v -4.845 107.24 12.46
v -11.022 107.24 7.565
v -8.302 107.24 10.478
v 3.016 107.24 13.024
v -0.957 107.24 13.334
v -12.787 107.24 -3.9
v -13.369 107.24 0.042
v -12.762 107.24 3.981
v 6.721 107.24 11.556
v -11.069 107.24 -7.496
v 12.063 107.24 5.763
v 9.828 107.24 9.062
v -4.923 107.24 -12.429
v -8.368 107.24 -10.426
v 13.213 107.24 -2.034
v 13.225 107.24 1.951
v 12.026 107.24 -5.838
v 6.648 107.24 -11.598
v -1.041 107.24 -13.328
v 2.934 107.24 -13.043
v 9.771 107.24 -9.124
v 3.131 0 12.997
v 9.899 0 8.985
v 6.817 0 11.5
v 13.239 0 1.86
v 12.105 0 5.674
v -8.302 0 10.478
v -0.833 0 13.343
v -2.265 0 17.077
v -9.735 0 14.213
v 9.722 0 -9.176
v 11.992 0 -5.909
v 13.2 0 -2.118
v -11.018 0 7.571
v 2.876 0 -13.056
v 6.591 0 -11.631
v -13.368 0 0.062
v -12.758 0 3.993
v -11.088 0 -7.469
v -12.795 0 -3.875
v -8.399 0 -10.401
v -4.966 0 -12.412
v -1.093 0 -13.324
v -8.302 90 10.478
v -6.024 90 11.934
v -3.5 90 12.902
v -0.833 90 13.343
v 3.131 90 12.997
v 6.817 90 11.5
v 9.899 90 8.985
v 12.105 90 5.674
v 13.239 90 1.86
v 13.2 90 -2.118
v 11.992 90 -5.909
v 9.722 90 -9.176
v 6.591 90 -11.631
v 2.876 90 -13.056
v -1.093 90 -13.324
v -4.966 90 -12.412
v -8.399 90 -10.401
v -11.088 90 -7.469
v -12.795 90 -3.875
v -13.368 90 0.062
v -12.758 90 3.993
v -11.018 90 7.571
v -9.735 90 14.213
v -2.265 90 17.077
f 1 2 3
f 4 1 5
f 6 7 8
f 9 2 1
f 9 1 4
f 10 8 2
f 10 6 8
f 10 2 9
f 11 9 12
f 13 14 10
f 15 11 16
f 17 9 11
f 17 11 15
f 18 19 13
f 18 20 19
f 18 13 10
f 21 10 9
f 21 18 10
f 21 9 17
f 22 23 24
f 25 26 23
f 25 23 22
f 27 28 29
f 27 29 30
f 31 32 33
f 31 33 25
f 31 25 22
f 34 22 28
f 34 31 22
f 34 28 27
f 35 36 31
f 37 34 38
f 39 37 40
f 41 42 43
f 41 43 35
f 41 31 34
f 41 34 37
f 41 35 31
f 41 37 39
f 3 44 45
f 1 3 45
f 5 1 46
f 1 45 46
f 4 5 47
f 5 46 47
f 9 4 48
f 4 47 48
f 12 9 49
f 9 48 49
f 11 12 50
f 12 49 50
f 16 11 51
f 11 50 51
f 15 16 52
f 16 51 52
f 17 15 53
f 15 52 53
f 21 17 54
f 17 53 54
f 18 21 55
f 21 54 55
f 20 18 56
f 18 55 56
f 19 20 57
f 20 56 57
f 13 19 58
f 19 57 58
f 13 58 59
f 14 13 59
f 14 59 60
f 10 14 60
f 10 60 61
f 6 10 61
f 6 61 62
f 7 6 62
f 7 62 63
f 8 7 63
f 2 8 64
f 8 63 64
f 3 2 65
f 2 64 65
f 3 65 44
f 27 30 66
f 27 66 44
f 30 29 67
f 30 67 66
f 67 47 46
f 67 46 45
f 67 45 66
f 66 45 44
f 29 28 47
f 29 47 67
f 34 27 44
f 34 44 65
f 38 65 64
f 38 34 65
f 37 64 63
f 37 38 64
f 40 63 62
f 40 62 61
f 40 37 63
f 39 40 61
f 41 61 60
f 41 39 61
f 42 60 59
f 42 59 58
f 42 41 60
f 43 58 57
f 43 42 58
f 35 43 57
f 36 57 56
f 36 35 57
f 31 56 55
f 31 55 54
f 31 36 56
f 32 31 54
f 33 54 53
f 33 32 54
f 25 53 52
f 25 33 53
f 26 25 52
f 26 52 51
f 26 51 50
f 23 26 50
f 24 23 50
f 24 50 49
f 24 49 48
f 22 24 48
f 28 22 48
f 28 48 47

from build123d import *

# Parameters (mm, degrees)
BOSS_EXTRUDE1_DEPTH = 90
SKETCH3_R           = 13.36858006
BOSS_EXTRUDE2_DEPTH = 550
SKETCH4_R           = 30
CUT_EXTRUDE1_DEPTH  = 532.76


with BuildPart() as part:
    # Sketch2 → Boss-Extrude1 (new body)
    with BuildSketch(Plane(origin=(0, 0, 0), x_dir=(1, 0, 0), z_dir=(0, 1, 0))):
        with BuildLine():
            Line((-0.832718515, -13.342620159), (-2.264973014, -17.077408915))
            Line((-2.264973014, -17.077408915), (-9.734550526, -14.212899917))
            Line((-9.734550526, -14.212899917), (-8.302296027, -10.478111162))
            ThreePointArc((-8.302296027, -10.478111162), (4.786802233, 12.482205623), (-0.832718515, -13.342620159))
        make_face()
    extrude(amount=BOSS_EXTRUDE1_DEPTH)

    # Sketch3 → Boss-Extrude2 (add)
    with BuildSketch(Plane(origin=(0, 90, 0), x_dir=(1, 0, 0), z_dir=(0, 1, 0))):
        with Locations(Location((0, 0, 0), (0, 0, 231.608573475))):
            Circle(SKETCH3_R)
    extrude(amount=BOSS_EXTRUDE2_DEPTH)

    # Sketch4 → Cut-Extrude1 (cut)
    with BuildSketch(Plane(origin=(0, 640, 0), x_dir=(1, 0, 0), z_dir=(0, 1, 0))):
        Circle(SKETCH4_R)
    extrude(amount=-CUT_EXTRUDE1_DEPTH, mode=Mode.SUBTRACT)


solid = part.part
